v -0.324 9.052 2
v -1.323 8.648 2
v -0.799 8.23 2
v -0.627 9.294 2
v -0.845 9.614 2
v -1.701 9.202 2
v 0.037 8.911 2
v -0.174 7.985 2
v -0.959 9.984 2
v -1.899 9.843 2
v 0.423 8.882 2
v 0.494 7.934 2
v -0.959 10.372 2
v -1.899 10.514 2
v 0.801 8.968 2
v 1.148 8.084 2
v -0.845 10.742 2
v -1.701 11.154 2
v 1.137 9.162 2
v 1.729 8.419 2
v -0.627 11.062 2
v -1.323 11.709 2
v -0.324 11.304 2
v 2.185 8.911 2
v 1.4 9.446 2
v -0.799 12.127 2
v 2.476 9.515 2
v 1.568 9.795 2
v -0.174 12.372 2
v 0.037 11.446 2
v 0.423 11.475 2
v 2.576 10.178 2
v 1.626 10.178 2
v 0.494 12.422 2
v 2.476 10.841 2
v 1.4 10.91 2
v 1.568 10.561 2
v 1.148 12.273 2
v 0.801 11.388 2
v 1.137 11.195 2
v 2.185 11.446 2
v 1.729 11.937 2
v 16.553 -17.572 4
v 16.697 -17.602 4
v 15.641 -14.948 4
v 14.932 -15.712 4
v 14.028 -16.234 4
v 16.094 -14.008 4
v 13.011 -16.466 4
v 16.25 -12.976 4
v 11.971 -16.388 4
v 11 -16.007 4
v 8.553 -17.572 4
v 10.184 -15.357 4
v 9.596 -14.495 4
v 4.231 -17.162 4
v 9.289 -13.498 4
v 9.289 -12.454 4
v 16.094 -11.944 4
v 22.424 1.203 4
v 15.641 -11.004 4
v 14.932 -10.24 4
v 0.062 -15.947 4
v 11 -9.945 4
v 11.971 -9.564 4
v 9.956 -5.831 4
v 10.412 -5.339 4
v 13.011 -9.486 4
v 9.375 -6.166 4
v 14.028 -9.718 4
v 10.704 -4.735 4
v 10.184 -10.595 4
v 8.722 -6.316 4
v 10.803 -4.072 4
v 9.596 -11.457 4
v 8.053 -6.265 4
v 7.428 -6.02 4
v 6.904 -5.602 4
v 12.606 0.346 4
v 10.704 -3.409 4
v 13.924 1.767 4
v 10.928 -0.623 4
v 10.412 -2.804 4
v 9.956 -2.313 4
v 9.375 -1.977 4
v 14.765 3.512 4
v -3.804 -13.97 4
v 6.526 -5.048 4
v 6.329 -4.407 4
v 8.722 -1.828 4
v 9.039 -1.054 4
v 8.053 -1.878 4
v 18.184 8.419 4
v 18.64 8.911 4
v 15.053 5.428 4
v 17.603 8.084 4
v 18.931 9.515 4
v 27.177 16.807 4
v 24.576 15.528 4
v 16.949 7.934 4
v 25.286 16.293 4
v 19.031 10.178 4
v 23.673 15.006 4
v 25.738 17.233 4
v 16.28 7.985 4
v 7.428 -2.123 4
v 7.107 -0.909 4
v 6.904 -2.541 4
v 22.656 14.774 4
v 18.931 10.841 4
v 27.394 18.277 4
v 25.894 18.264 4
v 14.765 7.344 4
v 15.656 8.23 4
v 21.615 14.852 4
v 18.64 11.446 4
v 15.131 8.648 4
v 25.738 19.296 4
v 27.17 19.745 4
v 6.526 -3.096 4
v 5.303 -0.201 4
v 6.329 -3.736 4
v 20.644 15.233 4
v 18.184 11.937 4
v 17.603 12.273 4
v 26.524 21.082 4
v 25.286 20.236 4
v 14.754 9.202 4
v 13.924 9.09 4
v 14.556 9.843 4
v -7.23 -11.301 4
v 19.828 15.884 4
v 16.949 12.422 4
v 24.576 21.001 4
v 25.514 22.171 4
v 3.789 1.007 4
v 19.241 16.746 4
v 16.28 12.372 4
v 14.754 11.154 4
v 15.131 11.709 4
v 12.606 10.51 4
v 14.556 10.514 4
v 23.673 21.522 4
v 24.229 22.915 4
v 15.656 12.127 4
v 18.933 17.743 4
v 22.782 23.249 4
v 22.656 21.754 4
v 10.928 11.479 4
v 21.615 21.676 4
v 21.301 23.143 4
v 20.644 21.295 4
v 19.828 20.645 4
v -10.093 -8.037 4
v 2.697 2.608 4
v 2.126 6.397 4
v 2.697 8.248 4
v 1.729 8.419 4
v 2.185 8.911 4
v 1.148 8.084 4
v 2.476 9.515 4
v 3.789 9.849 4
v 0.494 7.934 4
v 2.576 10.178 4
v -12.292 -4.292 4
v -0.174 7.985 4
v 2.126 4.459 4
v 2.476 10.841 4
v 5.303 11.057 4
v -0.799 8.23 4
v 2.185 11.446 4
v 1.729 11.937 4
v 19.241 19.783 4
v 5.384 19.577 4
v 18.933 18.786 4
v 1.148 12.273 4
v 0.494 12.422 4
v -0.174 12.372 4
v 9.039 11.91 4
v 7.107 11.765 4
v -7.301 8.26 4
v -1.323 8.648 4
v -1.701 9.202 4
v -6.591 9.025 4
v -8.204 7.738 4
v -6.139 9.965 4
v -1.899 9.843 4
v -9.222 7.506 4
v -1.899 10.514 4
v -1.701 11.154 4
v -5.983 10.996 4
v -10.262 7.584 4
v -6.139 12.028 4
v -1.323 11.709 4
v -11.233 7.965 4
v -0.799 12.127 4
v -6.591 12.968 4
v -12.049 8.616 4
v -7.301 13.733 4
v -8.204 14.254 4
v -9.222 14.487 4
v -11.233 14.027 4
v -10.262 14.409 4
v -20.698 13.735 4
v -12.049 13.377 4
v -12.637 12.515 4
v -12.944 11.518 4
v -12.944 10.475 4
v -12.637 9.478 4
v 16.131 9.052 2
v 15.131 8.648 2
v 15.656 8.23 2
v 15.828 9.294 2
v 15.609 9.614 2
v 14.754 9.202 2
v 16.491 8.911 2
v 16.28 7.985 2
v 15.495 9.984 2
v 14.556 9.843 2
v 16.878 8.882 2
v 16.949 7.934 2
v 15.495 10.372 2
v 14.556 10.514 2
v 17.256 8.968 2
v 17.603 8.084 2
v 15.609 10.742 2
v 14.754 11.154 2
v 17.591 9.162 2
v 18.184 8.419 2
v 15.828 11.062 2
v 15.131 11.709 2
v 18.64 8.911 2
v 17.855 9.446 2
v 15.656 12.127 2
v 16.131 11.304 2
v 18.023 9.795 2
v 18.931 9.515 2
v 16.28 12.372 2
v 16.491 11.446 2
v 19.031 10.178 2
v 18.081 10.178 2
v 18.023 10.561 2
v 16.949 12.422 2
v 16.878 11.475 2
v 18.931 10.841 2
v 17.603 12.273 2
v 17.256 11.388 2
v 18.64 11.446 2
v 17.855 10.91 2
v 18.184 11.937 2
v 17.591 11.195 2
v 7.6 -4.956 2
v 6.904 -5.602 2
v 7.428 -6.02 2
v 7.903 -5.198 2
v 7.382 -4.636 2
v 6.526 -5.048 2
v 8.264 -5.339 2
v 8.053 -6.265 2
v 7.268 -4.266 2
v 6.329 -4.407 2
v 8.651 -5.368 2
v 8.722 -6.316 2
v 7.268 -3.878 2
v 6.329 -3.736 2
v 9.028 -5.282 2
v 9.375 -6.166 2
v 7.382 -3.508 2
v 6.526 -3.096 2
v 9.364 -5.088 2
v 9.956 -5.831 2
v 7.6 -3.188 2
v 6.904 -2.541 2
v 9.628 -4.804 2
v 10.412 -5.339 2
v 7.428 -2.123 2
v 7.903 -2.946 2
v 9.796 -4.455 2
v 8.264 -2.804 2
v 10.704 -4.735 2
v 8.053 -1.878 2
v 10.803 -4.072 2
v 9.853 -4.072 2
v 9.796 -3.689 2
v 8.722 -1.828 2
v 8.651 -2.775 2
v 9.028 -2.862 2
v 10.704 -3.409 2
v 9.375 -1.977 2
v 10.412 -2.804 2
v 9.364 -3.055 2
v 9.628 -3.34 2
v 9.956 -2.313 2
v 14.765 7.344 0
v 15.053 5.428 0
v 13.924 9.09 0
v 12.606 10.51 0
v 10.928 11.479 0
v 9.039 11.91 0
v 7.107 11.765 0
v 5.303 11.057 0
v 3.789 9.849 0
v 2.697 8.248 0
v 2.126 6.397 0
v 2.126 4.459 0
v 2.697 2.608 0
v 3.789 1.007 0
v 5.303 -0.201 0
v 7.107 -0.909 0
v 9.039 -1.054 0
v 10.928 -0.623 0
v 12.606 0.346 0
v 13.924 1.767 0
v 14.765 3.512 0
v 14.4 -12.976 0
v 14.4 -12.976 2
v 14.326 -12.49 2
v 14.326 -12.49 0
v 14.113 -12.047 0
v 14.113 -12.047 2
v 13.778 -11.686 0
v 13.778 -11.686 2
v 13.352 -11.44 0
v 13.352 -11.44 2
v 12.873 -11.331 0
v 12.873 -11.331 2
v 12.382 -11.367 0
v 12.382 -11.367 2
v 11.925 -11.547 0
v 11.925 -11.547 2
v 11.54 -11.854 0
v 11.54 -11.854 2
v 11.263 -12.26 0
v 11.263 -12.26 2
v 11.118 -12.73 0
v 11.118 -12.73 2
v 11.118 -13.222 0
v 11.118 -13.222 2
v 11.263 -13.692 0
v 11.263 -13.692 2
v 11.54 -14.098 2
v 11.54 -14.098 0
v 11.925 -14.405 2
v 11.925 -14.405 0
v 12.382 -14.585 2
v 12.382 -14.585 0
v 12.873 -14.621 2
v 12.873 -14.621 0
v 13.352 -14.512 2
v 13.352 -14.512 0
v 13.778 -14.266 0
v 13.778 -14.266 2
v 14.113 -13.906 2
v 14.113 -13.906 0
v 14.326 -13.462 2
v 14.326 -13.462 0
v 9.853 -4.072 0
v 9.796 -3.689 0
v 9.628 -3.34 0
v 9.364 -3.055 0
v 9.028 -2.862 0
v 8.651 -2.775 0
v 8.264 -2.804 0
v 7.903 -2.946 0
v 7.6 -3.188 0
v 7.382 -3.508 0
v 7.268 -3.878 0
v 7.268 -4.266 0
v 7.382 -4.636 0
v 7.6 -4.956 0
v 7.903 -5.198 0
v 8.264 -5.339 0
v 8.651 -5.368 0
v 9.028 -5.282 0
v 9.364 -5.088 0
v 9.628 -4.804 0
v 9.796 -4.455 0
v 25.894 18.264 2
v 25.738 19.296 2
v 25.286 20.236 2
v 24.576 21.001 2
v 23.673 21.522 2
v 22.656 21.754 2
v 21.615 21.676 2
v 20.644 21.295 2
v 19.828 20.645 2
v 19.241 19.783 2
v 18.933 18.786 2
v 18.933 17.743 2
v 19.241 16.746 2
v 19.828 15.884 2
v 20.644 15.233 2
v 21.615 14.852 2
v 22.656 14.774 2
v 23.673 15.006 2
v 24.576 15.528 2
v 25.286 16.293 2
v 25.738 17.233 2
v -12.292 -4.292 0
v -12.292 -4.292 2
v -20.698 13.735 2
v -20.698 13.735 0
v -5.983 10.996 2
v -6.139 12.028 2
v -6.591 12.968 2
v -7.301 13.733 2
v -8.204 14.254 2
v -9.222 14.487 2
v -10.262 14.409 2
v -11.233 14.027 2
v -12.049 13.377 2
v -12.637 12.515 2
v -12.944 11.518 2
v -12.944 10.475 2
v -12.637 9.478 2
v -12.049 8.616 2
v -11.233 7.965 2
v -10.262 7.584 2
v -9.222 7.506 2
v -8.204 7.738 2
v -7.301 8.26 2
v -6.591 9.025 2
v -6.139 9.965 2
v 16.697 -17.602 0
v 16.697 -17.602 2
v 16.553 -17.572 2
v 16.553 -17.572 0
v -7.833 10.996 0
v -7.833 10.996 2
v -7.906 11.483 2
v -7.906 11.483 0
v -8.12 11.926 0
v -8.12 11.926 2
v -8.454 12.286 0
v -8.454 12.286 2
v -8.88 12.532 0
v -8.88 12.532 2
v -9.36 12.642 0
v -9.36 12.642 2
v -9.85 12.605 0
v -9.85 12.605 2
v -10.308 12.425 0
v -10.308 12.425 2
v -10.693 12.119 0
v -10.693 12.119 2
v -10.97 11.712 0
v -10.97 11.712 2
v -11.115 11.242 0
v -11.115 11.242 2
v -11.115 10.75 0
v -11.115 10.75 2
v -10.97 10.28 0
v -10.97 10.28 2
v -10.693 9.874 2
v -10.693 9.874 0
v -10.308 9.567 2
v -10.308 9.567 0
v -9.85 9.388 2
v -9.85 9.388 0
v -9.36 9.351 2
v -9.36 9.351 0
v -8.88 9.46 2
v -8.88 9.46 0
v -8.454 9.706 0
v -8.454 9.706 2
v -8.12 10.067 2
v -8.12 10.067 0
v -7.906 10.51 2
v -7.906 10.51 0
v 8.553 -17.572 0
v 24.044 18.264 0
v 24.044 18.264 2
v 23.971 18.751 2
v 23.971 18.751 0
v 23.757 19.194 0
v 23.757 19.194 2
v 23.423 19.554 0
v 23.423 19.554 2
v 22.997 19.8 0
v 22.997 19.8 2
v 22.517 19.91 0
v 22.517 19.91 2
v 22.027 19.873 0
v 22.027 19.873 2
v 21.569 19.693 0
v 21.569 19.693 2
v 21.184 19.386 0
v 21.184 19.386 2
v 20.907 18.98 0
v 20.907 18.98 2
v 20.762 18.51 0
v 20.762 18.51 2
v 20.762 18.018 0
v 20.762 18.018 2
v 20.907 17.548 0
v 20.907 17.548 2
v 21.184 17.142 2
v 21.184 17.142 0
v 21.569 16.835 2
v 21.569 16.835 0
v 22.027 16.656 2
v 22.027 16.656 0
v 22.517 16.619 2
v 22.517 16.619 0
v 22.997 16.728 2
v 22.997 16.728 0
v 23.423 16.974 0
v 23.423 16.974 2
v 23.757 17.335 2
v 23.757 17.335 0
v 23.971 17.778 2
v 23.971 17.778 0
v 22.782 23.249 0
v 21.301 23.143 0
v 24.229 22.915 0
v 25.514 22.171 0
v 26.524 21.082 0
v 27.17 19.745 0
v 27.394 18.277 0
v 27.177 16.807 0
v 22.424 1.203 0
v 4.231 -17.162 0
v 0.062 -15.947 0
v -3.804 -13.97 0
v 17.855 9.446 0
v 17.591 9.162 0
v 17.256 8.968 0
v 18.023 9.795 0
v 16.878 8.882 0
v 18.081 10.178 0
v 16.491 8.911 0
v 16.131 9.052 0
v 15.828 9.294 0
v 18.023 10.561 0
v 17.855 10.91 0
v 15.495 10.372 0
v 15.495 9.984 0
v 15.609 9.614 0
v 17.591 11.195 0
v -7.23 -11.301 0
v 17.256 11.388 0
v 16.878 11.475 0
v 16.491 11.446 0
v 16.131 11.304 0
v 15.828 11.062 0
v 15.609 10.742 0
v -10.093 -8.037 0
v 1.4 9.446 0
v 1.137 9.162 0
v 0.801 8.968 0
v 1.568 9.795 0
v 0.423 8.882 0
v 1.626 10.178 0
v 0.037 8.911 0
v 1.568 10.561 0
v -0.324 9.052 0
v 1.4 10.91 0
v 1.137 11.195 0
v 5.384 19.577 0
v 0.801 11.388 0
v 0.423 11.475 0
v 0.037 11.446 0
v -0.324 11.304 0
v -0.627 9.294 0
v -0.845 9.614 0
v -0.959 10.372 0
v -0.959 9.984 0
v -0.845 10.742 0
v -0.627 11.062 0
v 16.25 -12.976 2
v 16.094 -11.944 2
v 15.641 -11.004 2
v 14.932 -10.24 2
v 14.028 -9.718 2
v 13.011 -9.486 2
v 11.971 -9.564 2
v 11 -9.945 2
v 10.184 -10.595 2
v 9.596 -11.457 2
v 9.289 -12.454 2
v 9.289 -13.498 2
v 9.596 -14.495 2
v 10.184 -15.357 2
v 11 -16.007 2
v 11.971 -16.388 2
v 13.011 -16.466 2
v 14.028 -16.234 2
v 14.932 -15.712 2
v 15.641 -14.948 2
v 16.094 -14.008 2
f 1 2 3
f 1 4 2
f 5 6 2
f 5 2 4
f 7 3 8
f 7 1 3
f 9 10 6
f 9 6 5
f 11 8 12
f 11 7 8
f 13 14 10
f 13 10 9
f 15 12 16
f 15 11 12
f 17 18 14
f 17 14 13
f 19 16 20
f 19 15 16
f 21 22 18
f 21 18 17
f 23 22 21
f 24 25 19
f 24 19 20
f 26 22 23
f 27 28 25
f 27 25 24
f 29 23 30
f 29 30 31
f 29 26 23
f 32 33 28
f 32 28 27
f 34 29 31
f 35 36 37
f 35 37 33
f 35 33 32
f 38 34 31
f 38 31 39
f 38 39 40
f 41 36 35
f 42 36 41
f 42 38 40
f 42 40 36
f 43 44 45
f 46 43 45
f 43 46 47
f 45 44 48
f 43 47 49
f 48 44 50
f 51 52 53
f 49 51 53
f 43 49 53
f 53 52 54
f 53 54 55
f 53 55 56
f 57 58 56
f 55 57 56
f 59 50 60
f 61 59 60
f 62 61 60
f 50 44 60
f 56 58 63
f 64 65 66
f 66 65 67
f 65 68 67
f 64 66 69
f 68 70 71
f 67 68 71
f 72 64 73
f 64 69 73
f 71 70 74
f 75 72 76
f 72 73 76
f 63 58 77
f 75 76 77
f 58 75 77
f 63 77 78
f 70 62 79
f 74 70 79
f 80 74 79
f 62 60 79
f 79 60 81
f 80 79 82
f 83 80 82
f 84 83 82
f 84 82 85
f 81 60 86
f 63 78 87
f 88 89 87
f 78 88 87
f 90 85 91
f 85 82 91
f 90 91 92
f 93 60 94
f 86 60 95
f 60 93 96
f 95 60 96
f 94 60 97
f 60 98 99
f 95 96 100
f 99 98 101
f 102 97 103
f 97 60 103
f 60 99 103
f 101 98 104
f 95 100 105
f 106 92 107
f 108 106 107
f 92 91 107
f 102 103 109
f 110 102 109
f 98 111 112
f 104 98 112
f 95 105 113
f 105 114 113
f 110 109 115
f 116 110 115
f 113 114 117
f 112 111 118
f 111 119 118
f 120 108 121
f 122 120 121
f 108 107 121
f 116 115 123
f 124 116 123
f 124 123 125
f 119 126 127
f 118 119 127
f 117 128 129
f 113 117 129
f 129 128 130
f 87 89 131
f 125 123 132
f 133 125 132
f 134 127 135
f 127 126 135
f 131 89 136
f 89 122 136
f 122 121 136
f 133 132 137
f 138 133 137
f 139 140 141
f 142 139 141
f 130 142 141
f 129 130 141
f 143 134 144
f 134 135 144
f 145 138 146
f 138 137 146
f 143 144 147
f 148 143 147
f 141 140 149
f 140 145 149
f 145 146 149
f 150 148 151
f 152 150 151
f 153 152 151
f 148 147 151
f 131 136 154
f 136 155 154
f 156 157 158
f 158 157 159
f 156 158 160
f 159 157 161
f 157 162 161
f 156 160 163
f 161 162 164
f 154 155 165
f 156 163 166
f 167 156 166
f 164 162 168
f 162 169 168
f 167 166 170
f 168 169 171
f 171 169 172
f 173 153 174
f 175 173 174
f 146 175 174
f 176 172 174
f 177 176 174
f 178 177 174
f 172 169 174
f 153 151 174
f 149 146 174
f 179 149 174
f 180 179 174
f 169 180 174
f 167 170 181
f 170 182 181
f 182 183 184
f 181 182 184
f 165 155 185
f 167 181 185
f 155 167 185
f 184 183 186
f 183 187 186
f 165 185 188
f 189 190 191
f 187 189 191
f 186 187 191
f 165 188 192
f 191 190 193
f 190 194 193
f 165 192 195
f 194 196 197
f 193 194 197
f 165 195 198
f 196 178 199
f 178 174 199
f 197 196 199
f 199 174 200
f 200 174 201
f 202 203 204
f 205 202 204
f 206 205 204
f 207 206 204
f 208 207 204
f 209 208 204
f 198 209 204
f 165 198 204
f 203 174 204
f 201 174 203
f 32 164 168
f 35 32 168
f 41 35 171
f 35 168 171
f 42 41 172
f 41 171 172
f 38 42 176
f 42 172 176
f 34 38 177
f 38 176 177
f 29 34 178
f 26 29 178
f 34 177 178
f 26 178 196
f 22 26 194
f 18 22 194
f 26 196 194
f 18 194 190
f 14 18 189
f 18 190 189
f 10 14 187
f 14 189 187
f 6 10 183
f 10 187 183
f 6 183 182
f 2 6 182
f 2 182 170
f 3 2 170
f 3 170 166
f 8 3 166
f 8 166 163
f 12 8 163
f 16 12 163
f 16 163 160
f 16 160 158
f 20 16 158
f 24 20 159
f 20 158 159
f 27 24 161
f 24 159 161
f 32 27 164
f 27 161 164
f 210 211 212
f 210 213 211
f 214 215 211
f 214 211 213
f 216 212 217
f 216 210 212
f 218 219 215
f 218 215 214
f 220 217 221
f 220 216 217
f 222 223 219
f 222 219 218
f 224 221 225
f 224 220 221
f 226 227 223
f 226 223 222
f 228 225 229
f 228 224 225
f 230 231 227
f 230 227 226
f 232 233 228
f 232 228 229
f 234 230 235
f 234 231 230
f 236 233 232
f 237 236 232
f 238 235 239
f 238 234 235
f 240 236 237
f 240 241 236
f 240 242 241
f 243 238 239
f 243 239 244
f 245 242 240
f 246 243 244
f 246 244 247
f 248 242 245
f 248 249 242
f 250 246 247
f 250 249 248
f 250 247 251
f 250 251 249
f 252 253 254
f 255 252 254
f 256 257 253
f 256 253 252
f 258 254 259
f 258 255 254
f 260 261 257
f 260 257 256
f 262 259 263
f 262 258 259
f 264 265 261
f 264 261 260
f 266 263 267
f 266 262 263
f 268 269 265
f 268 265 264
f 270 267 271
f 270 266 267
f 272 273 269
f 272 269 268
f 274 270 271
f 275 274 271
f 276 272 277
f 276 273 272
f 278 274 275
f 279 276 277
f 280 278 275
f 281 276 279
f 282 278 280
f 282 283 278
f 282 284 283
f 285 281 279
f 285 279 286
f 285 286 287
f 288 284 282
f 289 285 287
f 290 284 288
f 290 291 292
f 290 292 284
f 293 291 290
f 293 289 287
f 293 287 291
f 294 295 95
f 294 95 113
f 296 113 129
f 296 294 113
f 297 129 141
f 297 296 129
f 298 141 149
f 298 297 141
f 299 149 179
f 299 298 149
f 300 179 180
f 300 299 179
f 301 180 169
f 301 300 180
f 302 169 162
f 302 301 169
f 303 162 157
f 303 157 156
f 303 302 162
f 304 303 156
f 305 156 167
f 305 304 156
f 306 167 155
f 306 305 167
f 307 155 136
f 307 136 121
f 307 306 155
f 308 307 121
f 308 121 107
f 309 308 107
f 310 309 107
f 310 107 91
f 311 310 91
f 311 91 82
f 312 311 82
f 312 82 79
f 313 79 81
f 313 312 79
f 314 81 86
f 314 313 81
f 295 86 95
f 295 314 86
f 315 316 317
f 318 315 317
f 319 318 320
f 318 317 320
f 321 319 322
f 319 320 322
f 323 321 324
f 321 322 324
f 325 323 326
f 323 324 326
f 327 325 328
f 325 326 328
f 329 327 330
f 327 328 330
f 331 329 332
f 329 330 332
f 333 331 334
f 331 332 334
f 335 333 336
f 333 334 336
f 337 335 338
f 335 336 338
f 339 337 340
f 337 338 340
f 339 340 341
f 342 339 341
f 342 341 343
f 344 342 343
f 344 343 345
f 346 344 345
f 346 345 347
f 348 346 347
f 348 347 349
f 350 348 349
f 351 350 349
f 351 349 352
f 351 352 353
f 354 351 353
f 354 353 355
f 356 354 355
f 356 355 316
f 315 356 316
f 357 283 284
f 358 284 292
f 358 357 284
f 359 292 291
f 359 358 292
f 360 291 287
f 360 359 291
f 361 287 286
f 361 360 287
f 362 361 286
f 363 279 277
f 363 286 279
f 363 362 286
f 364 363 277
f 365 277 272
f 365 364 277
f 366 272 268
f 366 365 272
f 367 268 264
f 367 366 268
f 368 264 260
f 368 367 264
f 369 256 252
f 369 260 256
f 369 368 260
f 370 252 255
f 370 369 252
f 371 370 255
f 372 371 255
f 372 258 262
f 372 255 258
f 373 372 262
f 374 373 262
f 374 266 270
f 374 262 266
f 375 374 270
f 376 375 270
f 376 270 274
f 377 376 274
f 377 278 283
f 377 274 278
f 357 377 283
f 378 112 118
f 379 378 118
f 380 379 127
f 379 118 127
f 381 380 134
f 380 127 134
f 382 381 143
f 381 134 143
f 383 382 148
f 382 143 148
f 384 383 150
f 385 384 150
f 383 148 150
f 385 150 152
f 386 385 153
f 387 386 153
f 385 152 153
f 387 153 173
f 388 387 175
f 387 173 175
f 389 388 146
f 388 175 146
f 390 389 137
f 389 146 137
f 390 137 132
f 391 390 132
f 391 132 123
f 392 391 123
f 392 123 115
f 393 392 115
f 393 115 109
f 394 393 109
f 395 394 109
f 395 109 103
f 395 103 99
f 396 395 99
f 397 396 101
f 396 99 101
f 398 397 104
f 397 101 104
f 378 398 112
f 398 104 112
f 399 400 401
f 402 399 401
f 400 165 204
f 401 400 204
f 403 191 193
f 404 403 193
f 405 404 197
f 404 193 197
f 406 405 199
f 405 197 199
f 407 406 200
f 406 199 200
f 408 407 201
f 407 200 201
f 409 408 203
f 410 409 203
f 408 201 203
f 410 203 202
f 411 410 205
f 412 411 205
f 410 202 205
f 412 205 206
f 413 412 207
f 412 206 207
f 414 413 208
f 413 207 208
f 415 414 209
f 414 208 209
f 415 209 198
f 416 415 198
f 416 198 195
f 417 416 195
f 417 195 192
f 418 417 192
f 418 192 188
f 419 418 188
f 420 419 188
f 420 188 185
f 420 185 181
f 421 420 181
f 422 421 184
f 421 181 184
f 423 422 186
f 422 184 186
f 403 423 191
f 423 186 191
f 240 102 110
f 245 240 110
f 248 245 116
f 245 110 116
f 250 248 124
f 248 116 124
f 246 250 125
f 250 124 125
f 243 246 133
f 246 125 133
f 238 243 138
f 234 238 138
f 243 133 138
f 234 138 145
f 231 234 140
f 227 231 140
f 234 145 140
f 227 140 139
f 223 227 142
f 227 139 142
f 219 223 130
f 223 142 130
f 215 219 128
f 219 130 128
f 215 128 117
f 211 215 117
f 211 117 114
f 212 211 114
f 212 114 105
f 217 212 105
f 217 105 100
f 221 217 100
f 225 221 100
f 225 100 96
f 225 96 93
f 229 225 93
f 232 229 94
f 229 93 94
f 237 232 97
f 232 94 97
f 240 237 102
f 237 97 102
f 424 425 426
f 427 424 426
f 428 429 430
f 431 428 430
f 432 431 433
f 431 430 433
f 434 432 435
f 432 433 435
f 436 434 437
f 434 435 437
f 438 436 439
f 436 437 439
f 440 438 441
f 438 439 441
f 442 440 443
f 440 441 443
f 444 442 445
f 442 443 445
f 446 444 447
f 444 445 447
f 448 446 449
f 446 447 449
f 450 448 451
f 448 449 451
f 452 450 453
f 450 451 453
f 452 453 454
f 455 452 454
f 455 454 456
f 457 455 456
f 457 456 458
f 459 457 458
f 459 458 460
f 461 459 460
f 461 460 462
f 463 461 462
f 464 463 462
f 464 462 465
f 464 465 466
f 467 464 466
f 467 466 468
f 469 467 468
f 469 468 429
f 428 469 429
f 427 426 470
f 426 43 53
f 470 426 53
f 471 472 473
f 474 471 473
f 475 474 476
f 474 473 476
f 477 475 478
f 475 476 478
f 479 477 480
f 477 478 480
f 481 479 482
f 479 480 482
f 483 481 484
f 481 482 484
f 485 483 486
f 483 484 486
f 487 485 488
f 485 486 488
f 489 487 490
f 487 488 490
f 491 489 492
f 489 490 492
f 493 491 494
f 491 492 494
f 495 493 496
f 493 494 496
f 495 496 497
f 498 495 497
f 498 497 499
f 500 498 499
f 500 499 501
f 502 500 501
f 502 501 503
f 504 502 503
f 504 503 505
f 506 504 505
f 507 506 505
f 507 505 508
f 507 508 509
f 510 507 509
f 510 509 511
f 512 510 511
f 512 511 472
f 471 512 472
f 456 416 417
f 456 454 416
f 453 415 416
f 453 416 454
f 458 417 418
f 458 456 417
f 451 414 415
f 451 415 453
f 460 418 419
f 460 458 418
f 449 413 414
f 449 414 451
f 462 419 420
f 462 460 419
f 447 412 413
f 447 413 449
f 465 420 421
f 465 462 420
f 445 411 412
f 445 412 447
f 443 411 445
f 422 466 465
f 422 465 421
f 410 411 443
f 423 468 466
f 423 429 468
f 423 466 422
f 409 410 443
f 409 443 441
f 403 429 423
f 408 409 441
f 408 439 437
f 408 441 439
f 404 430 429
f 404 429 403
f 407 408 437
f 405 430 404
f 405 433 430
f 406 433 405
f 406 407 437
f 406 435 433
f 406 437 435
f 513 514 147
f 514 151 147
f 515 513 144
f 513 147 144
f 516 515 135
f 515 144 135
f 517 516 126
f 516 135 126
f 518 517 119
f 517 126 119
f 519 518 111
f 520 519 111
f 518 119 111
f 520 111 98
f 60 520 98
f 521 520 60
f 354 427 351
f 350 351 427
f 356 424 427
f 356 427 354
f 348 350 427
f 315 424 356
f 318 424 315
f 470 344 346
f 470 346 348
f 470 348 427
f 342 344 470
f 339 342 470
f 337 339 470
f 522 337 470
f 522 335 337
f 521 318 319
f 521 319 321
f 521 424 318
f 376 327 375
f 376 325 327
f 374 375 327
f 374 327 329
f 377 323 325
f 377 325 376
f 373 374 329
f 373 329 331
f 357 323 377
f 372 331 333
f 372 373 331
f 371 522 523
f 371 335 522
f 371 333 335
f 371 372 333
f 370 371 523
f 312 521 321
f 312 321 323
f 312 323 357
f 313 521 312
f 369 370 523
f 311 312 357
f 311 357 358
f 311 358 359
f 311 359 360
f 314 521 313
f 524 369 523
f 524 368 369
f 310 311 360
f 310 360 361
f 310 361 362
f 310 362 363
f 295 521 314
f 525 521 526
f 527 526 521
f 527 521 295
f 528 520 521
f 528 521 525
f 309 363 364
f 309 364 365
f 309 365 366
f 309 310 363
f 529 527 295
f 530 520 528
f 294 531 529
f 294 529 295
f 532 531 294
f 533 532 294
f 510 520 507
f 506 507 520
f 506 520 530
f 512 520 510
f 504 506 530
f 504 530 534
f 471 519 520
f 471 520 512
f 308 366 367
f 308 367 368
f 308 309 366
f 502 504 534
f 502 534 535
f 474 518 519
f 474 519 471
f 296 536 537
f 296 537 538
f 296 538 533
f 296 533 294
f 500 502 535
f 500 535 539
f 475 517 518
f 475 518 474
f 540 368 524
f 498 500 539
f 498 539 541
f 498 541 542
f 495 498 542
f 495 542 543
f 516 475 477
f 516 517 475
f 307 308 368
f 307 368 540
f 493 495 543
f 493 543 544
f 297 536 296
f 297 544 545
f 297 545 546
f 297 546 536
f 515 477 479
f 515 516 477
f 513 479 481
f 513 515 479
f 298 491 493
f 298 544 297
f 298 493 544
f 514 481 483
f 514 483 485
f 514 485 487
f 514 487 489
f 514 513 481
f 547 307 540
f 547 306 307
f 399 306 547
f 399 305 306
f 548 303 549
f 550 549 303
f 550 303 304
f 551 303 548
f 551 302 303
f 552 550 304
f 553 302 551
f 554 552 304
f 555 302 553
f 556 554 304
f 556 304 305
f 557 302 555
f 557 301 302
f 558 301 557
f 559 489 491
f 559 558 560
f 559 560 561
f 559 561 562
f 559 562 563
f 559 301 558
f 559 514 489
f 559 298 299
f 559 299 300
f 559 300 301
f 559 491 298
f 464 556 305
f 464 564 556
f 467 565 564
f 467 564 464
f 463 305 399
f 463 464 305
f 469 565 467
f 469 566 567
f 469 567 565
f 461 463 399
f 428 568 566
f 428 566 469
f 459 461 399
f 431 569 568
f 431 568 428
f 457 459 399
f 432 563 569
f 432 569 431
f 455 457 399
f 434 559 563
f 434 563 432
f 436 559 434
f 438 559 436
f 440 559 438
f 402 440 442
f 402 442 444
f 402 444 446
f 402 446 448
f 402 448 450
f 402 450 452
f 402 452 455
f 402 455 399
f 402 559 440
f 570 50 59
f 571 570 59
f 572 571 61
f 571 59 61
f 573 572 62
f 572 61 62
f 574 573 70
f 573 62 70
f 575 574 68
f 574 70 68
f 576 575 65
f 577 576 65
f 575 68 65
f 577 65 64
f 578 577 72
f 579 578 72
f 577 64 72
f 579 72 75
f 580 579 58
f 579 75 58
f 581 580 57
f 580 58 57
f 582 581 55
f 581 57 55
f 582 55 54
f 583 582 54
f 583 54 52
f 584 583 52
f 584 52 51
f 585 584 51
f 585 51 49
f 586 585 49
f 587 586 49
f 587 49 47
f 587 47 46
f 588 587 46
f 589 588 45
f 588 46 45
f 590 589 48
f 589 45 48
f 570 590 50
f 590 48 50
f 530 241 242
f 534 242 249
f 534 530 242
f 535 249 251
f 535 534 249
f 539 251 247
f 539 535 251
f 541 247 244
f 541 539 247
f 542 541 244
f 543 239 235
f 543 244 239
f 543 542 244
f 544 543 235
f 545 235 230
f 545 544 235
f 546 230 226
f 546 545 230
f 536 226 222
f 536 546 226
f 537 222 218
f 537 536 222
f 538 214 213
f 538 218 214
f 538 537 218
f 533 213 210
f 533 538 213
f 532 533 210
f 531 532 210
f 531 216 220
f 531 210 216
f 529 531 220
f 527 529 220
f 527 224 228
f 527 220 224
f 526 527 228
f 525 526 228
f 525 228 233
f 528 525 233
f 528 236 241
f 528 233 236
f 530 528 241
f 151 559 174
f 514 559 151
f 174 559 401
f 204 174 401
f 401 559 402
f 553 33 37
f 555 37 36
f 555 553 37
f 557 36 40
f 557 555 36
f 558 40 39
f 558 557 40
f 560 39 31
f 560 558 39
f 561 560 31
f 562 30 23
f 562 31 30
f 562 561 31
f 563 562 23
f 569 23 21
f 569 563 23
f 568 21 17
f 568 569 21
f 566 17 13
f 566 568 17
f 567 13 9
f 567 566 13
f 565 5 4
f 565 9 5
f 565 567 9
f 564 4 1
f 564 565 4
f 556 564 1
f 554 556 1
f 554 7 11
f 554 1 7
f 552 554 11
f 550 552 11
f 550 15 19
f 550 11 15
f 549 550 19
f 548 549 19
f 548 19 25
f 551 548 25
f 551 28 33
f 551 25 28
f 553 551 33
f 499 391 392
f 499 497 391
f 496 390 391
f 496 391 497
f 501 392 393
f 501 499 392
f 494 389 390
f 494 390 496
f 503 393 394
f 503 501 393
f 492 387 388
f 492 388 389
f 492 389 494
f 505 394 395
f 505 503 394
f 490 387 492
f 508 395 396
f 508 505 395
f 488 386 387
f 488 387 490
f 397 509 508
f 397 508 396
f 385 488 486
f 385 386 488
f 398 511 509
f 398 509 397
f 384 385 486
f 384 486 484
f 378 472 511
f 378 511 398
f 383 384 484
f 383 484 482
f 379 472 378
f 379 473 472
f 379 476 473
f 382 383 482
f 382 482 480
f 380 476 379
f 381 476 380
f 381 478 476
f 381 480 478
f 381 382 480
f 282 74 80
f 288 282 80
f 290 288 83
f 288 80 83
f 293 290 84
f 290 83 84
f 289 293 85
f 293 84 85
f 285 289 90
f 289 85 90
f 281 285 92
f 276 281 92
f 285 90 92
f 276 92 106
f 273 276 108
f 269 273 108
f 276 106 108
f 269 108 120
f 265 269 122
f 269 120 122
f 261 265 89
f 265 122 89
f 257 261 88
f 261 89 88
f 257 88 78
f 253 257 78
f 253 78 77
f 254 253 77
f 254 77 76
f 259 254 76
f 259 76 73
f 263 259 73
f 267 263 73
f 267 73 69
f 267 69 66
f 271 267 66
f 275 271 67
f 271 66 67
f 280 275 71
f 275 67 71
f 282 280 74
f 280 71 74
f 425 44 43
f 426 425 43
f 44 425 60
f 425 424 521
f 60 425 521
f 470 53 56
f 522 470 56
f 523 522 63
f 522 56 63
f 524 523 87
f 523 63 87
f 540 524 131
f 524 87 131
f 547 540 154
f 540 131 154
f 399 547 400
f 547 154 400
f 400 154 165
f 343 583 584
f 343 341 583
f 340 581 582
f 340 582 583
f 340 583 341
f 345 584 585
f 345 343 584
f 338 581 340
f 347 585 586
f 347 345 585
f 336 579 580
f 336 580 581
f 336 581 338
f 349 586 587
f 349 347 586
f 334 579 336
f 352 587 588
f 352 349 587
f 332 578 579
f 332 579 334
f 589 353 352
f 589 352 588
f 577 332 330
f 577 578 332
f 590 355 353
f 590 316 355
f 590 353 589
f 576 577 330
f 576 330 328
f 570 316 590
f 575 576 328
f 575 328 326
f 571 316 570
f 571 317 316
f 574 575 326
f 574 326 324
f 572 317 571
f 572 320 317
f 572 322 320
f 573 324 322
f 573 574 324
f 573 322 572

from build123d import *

# Parameters (mm, degrees)
SKETCH_1_R          = 1.3
SKETCH_1_R_2        = 6.5
EXTRUDE_1_DEPTH     = 4
CUT_EXTRUDE_1_DEPTH = 2
CUT_EXTRUDE_2_DEPTH = 10
EXTRUDE_START       = -4
EXTRUDE_2_DEPTH     = 4
FILLET_1_R          = 5
SKETCH_5_R          = 1.65
CUT_EXTRUDE_3_DEPTH = 10
SKETCH_6_R          = 3.5
SKETCH_6_R_2        = 2.25
CUT_EXTRUDE_4_DEPTH = 2


with BuildPart() as part:
    # 草图1 → 凸台-拉伸1 (new body)
    with BuildSketch(Plane.XY):
        with BuildLine():
            Line((8.553461717, -18.071837398), (16.553461717, -18.071837398))
            Line((16.553461717, -18.071837398), (22.424329469, 1.203351624))
            ThreePointArc((22.424329469, 1.203351624), (19.185042818, 15.288156683), (5.383718421, 19.577463907))
            Line((5.383718421, 19.577463907), (-21.197136513, 13.622789192))
            Line((-21.197136513, 13.622789192), (-12.744771278, -4.503366549))
            ThreePointArc((-12.744771278, -4.503366549), (-4.073079079, -14.391536375), (8.553461717, -18.071837398))
        make_face()
        with Locations((16.780703053, 10.178162602)):
            Circle(SKETCH_1_R, mode=Mode.SUBTRACT)
        with Locations((8.553461717, -4.071837398)):
            Circle(SKETCH_1_R, mode=Mode.SUBTRACT)
        with Locations((8.553461717, 5.428162602)):
            Circle(SKETCH_1_R_2, mode=Mode.SUBTRACT)
        with Locations((0.326220381, 10.178162602)):
            Circle(SKETCH_1_R, mode=Mode.SUBTRACT)
    extrude(amount=EXTRUDE_1_DEPTH)

    # 草图2 → 切除-拉伸1 (cut)
    with BuildSketch(Plane.XY.offset(4)):
        with BuildLine():
            Line((-20.74398262, 13.834098323), (-26.791770356, 13.834098323))
            Line((-26.791770356, 13.834098323), (-7.810487919, -16.678792008))
            Line((-7.810487919, -16.678792008), (17.290442954, -20.516537637))
            Line((17.290442954, -20.516537637), (21.405478984, -18.597664823))
            Line((21.405478984, -18.597664823), (16.553461717, -17.571837398))
            Line((16.553461717, -17.571837398), (8.553461717, -17.571837398))
            ThreePointArc((8.553461717, -17.571837398), (-3.804429275, -13.969840652), (-12.291617385, -4.292057418))
            Line((-12.291617385, -4.292057418), (-20.74398262, 13.834098323))
        make_face()
    extrude(amount=-CUT_EXTRUDE_1_DEPTH, mode=Mode.SUBTRACT)

    # 草图3 → 切除-拉伸2 (cut)
    with BuildSketch(Plane.XY.offset(4)):
        with BuildLine():
            Line((16.553461717, -18.071837398), (16.696538979, -17.602087204))
            Line((16.696538979, -17.602087204), (16.553461717, -17.571837398))
            Line((16.553461717, -17.571837398), (8.553461717, -17.571837398))
            ThreePointArc((8.553461717, -17.571837398), (-3.804429275, -13.969840652), (-12.291617385, -4.292057418))
            Line((-12.291617385, -4.292057418), (-20.697627647, 13.734689762))
            Line((-20.697627647, 13.734689762), (-21.197136513, 13.622789192))
            Line((-21.197136513, 13.622789192), (-12.744771278, -4.503366549))
            ThreePointArc((-12.744771278, -4.503366549), (-4.073079079, -14.391536375), (8.553461717, -18.071837398))
            Line((8.553461717, -18.071837398), (16.553461717, -18.071837398))
        make_face()
    extrude(amount=-CUT_EXTRUDE_2_DEPTH, mode=Mode.SUBTRACT)

    # 草图4 → 凸台-拉伸2 (add)
    with BuildSketch(Plane.XY.offset(4).offset(EXTRUDE_START)):
        with BuildLine():
            Line((5.383718421, 19.577463907), (29.678441091, 25.019996556))
            Line((29.678441091, 25.019996556), (22.424329469, 1.203351624))
            ThreePointArc((22.424329469, 1.203351624), (19.185042818, 15.288156683), (5.383718421, 19.577463907))
        make_face()
    extrude(amount=EXTRUDE_2_DEPTH)

    # 圆角1
    fillet_1_edges = [part.edges().sort_by_distance(p)[0] for p in [
        (29.678441091, 25.019996556, 2),
    ]]
    fillet(fillet_1_edges, radius=FILLET_1_R)

    # 草图5 → 切除-拉伸3 (cut)
    with BuildSketch(Plane.XY.offset(4)):
        with Locations((22.393965445, 18.264191744)):
            Circle(SKETCH_5_R)
        with Locations((-9.483117468, 10.99637586)):
            Circle(SKETCH_5_R)
        with Locations((12.749537174, -12.976079799)):
            Circle(SKETCH_5_R)
    extrude(amount=-CUT_EXTRUDE_3_DEPTH, mode=Mode.SUBTRACT)

    # 草图6 → 切除-拉伸4 (cut)
    with BuildSketch(Plane.XY.offset(4)):
        with Locations((22.393965445, 18.264191744)):
            Circle(SKETCH_6_R)
        with Locations((-9.483117468, 10.99637586)):
            Circle(SKETCH_6_R)
        with Locations((12.749537174, -12.976079799)):
            Circle(SKETCH_6_R)
        with Locations((8.553461717, -4.071837398)):
            Circle(SKETCH_6_R_2)
        with Locations((16.780703053, 10.178162602)):
            Circle(SKETCH_6_R_2)
        with Locations((0.326220381, 10.178162602)):
            Circle(SKETCH_6_R_2)
    extrude(amount=-CUT_EXTRUDE_4_DEPTH, mode=Mode.SUBTRACT)


solid = part.part
